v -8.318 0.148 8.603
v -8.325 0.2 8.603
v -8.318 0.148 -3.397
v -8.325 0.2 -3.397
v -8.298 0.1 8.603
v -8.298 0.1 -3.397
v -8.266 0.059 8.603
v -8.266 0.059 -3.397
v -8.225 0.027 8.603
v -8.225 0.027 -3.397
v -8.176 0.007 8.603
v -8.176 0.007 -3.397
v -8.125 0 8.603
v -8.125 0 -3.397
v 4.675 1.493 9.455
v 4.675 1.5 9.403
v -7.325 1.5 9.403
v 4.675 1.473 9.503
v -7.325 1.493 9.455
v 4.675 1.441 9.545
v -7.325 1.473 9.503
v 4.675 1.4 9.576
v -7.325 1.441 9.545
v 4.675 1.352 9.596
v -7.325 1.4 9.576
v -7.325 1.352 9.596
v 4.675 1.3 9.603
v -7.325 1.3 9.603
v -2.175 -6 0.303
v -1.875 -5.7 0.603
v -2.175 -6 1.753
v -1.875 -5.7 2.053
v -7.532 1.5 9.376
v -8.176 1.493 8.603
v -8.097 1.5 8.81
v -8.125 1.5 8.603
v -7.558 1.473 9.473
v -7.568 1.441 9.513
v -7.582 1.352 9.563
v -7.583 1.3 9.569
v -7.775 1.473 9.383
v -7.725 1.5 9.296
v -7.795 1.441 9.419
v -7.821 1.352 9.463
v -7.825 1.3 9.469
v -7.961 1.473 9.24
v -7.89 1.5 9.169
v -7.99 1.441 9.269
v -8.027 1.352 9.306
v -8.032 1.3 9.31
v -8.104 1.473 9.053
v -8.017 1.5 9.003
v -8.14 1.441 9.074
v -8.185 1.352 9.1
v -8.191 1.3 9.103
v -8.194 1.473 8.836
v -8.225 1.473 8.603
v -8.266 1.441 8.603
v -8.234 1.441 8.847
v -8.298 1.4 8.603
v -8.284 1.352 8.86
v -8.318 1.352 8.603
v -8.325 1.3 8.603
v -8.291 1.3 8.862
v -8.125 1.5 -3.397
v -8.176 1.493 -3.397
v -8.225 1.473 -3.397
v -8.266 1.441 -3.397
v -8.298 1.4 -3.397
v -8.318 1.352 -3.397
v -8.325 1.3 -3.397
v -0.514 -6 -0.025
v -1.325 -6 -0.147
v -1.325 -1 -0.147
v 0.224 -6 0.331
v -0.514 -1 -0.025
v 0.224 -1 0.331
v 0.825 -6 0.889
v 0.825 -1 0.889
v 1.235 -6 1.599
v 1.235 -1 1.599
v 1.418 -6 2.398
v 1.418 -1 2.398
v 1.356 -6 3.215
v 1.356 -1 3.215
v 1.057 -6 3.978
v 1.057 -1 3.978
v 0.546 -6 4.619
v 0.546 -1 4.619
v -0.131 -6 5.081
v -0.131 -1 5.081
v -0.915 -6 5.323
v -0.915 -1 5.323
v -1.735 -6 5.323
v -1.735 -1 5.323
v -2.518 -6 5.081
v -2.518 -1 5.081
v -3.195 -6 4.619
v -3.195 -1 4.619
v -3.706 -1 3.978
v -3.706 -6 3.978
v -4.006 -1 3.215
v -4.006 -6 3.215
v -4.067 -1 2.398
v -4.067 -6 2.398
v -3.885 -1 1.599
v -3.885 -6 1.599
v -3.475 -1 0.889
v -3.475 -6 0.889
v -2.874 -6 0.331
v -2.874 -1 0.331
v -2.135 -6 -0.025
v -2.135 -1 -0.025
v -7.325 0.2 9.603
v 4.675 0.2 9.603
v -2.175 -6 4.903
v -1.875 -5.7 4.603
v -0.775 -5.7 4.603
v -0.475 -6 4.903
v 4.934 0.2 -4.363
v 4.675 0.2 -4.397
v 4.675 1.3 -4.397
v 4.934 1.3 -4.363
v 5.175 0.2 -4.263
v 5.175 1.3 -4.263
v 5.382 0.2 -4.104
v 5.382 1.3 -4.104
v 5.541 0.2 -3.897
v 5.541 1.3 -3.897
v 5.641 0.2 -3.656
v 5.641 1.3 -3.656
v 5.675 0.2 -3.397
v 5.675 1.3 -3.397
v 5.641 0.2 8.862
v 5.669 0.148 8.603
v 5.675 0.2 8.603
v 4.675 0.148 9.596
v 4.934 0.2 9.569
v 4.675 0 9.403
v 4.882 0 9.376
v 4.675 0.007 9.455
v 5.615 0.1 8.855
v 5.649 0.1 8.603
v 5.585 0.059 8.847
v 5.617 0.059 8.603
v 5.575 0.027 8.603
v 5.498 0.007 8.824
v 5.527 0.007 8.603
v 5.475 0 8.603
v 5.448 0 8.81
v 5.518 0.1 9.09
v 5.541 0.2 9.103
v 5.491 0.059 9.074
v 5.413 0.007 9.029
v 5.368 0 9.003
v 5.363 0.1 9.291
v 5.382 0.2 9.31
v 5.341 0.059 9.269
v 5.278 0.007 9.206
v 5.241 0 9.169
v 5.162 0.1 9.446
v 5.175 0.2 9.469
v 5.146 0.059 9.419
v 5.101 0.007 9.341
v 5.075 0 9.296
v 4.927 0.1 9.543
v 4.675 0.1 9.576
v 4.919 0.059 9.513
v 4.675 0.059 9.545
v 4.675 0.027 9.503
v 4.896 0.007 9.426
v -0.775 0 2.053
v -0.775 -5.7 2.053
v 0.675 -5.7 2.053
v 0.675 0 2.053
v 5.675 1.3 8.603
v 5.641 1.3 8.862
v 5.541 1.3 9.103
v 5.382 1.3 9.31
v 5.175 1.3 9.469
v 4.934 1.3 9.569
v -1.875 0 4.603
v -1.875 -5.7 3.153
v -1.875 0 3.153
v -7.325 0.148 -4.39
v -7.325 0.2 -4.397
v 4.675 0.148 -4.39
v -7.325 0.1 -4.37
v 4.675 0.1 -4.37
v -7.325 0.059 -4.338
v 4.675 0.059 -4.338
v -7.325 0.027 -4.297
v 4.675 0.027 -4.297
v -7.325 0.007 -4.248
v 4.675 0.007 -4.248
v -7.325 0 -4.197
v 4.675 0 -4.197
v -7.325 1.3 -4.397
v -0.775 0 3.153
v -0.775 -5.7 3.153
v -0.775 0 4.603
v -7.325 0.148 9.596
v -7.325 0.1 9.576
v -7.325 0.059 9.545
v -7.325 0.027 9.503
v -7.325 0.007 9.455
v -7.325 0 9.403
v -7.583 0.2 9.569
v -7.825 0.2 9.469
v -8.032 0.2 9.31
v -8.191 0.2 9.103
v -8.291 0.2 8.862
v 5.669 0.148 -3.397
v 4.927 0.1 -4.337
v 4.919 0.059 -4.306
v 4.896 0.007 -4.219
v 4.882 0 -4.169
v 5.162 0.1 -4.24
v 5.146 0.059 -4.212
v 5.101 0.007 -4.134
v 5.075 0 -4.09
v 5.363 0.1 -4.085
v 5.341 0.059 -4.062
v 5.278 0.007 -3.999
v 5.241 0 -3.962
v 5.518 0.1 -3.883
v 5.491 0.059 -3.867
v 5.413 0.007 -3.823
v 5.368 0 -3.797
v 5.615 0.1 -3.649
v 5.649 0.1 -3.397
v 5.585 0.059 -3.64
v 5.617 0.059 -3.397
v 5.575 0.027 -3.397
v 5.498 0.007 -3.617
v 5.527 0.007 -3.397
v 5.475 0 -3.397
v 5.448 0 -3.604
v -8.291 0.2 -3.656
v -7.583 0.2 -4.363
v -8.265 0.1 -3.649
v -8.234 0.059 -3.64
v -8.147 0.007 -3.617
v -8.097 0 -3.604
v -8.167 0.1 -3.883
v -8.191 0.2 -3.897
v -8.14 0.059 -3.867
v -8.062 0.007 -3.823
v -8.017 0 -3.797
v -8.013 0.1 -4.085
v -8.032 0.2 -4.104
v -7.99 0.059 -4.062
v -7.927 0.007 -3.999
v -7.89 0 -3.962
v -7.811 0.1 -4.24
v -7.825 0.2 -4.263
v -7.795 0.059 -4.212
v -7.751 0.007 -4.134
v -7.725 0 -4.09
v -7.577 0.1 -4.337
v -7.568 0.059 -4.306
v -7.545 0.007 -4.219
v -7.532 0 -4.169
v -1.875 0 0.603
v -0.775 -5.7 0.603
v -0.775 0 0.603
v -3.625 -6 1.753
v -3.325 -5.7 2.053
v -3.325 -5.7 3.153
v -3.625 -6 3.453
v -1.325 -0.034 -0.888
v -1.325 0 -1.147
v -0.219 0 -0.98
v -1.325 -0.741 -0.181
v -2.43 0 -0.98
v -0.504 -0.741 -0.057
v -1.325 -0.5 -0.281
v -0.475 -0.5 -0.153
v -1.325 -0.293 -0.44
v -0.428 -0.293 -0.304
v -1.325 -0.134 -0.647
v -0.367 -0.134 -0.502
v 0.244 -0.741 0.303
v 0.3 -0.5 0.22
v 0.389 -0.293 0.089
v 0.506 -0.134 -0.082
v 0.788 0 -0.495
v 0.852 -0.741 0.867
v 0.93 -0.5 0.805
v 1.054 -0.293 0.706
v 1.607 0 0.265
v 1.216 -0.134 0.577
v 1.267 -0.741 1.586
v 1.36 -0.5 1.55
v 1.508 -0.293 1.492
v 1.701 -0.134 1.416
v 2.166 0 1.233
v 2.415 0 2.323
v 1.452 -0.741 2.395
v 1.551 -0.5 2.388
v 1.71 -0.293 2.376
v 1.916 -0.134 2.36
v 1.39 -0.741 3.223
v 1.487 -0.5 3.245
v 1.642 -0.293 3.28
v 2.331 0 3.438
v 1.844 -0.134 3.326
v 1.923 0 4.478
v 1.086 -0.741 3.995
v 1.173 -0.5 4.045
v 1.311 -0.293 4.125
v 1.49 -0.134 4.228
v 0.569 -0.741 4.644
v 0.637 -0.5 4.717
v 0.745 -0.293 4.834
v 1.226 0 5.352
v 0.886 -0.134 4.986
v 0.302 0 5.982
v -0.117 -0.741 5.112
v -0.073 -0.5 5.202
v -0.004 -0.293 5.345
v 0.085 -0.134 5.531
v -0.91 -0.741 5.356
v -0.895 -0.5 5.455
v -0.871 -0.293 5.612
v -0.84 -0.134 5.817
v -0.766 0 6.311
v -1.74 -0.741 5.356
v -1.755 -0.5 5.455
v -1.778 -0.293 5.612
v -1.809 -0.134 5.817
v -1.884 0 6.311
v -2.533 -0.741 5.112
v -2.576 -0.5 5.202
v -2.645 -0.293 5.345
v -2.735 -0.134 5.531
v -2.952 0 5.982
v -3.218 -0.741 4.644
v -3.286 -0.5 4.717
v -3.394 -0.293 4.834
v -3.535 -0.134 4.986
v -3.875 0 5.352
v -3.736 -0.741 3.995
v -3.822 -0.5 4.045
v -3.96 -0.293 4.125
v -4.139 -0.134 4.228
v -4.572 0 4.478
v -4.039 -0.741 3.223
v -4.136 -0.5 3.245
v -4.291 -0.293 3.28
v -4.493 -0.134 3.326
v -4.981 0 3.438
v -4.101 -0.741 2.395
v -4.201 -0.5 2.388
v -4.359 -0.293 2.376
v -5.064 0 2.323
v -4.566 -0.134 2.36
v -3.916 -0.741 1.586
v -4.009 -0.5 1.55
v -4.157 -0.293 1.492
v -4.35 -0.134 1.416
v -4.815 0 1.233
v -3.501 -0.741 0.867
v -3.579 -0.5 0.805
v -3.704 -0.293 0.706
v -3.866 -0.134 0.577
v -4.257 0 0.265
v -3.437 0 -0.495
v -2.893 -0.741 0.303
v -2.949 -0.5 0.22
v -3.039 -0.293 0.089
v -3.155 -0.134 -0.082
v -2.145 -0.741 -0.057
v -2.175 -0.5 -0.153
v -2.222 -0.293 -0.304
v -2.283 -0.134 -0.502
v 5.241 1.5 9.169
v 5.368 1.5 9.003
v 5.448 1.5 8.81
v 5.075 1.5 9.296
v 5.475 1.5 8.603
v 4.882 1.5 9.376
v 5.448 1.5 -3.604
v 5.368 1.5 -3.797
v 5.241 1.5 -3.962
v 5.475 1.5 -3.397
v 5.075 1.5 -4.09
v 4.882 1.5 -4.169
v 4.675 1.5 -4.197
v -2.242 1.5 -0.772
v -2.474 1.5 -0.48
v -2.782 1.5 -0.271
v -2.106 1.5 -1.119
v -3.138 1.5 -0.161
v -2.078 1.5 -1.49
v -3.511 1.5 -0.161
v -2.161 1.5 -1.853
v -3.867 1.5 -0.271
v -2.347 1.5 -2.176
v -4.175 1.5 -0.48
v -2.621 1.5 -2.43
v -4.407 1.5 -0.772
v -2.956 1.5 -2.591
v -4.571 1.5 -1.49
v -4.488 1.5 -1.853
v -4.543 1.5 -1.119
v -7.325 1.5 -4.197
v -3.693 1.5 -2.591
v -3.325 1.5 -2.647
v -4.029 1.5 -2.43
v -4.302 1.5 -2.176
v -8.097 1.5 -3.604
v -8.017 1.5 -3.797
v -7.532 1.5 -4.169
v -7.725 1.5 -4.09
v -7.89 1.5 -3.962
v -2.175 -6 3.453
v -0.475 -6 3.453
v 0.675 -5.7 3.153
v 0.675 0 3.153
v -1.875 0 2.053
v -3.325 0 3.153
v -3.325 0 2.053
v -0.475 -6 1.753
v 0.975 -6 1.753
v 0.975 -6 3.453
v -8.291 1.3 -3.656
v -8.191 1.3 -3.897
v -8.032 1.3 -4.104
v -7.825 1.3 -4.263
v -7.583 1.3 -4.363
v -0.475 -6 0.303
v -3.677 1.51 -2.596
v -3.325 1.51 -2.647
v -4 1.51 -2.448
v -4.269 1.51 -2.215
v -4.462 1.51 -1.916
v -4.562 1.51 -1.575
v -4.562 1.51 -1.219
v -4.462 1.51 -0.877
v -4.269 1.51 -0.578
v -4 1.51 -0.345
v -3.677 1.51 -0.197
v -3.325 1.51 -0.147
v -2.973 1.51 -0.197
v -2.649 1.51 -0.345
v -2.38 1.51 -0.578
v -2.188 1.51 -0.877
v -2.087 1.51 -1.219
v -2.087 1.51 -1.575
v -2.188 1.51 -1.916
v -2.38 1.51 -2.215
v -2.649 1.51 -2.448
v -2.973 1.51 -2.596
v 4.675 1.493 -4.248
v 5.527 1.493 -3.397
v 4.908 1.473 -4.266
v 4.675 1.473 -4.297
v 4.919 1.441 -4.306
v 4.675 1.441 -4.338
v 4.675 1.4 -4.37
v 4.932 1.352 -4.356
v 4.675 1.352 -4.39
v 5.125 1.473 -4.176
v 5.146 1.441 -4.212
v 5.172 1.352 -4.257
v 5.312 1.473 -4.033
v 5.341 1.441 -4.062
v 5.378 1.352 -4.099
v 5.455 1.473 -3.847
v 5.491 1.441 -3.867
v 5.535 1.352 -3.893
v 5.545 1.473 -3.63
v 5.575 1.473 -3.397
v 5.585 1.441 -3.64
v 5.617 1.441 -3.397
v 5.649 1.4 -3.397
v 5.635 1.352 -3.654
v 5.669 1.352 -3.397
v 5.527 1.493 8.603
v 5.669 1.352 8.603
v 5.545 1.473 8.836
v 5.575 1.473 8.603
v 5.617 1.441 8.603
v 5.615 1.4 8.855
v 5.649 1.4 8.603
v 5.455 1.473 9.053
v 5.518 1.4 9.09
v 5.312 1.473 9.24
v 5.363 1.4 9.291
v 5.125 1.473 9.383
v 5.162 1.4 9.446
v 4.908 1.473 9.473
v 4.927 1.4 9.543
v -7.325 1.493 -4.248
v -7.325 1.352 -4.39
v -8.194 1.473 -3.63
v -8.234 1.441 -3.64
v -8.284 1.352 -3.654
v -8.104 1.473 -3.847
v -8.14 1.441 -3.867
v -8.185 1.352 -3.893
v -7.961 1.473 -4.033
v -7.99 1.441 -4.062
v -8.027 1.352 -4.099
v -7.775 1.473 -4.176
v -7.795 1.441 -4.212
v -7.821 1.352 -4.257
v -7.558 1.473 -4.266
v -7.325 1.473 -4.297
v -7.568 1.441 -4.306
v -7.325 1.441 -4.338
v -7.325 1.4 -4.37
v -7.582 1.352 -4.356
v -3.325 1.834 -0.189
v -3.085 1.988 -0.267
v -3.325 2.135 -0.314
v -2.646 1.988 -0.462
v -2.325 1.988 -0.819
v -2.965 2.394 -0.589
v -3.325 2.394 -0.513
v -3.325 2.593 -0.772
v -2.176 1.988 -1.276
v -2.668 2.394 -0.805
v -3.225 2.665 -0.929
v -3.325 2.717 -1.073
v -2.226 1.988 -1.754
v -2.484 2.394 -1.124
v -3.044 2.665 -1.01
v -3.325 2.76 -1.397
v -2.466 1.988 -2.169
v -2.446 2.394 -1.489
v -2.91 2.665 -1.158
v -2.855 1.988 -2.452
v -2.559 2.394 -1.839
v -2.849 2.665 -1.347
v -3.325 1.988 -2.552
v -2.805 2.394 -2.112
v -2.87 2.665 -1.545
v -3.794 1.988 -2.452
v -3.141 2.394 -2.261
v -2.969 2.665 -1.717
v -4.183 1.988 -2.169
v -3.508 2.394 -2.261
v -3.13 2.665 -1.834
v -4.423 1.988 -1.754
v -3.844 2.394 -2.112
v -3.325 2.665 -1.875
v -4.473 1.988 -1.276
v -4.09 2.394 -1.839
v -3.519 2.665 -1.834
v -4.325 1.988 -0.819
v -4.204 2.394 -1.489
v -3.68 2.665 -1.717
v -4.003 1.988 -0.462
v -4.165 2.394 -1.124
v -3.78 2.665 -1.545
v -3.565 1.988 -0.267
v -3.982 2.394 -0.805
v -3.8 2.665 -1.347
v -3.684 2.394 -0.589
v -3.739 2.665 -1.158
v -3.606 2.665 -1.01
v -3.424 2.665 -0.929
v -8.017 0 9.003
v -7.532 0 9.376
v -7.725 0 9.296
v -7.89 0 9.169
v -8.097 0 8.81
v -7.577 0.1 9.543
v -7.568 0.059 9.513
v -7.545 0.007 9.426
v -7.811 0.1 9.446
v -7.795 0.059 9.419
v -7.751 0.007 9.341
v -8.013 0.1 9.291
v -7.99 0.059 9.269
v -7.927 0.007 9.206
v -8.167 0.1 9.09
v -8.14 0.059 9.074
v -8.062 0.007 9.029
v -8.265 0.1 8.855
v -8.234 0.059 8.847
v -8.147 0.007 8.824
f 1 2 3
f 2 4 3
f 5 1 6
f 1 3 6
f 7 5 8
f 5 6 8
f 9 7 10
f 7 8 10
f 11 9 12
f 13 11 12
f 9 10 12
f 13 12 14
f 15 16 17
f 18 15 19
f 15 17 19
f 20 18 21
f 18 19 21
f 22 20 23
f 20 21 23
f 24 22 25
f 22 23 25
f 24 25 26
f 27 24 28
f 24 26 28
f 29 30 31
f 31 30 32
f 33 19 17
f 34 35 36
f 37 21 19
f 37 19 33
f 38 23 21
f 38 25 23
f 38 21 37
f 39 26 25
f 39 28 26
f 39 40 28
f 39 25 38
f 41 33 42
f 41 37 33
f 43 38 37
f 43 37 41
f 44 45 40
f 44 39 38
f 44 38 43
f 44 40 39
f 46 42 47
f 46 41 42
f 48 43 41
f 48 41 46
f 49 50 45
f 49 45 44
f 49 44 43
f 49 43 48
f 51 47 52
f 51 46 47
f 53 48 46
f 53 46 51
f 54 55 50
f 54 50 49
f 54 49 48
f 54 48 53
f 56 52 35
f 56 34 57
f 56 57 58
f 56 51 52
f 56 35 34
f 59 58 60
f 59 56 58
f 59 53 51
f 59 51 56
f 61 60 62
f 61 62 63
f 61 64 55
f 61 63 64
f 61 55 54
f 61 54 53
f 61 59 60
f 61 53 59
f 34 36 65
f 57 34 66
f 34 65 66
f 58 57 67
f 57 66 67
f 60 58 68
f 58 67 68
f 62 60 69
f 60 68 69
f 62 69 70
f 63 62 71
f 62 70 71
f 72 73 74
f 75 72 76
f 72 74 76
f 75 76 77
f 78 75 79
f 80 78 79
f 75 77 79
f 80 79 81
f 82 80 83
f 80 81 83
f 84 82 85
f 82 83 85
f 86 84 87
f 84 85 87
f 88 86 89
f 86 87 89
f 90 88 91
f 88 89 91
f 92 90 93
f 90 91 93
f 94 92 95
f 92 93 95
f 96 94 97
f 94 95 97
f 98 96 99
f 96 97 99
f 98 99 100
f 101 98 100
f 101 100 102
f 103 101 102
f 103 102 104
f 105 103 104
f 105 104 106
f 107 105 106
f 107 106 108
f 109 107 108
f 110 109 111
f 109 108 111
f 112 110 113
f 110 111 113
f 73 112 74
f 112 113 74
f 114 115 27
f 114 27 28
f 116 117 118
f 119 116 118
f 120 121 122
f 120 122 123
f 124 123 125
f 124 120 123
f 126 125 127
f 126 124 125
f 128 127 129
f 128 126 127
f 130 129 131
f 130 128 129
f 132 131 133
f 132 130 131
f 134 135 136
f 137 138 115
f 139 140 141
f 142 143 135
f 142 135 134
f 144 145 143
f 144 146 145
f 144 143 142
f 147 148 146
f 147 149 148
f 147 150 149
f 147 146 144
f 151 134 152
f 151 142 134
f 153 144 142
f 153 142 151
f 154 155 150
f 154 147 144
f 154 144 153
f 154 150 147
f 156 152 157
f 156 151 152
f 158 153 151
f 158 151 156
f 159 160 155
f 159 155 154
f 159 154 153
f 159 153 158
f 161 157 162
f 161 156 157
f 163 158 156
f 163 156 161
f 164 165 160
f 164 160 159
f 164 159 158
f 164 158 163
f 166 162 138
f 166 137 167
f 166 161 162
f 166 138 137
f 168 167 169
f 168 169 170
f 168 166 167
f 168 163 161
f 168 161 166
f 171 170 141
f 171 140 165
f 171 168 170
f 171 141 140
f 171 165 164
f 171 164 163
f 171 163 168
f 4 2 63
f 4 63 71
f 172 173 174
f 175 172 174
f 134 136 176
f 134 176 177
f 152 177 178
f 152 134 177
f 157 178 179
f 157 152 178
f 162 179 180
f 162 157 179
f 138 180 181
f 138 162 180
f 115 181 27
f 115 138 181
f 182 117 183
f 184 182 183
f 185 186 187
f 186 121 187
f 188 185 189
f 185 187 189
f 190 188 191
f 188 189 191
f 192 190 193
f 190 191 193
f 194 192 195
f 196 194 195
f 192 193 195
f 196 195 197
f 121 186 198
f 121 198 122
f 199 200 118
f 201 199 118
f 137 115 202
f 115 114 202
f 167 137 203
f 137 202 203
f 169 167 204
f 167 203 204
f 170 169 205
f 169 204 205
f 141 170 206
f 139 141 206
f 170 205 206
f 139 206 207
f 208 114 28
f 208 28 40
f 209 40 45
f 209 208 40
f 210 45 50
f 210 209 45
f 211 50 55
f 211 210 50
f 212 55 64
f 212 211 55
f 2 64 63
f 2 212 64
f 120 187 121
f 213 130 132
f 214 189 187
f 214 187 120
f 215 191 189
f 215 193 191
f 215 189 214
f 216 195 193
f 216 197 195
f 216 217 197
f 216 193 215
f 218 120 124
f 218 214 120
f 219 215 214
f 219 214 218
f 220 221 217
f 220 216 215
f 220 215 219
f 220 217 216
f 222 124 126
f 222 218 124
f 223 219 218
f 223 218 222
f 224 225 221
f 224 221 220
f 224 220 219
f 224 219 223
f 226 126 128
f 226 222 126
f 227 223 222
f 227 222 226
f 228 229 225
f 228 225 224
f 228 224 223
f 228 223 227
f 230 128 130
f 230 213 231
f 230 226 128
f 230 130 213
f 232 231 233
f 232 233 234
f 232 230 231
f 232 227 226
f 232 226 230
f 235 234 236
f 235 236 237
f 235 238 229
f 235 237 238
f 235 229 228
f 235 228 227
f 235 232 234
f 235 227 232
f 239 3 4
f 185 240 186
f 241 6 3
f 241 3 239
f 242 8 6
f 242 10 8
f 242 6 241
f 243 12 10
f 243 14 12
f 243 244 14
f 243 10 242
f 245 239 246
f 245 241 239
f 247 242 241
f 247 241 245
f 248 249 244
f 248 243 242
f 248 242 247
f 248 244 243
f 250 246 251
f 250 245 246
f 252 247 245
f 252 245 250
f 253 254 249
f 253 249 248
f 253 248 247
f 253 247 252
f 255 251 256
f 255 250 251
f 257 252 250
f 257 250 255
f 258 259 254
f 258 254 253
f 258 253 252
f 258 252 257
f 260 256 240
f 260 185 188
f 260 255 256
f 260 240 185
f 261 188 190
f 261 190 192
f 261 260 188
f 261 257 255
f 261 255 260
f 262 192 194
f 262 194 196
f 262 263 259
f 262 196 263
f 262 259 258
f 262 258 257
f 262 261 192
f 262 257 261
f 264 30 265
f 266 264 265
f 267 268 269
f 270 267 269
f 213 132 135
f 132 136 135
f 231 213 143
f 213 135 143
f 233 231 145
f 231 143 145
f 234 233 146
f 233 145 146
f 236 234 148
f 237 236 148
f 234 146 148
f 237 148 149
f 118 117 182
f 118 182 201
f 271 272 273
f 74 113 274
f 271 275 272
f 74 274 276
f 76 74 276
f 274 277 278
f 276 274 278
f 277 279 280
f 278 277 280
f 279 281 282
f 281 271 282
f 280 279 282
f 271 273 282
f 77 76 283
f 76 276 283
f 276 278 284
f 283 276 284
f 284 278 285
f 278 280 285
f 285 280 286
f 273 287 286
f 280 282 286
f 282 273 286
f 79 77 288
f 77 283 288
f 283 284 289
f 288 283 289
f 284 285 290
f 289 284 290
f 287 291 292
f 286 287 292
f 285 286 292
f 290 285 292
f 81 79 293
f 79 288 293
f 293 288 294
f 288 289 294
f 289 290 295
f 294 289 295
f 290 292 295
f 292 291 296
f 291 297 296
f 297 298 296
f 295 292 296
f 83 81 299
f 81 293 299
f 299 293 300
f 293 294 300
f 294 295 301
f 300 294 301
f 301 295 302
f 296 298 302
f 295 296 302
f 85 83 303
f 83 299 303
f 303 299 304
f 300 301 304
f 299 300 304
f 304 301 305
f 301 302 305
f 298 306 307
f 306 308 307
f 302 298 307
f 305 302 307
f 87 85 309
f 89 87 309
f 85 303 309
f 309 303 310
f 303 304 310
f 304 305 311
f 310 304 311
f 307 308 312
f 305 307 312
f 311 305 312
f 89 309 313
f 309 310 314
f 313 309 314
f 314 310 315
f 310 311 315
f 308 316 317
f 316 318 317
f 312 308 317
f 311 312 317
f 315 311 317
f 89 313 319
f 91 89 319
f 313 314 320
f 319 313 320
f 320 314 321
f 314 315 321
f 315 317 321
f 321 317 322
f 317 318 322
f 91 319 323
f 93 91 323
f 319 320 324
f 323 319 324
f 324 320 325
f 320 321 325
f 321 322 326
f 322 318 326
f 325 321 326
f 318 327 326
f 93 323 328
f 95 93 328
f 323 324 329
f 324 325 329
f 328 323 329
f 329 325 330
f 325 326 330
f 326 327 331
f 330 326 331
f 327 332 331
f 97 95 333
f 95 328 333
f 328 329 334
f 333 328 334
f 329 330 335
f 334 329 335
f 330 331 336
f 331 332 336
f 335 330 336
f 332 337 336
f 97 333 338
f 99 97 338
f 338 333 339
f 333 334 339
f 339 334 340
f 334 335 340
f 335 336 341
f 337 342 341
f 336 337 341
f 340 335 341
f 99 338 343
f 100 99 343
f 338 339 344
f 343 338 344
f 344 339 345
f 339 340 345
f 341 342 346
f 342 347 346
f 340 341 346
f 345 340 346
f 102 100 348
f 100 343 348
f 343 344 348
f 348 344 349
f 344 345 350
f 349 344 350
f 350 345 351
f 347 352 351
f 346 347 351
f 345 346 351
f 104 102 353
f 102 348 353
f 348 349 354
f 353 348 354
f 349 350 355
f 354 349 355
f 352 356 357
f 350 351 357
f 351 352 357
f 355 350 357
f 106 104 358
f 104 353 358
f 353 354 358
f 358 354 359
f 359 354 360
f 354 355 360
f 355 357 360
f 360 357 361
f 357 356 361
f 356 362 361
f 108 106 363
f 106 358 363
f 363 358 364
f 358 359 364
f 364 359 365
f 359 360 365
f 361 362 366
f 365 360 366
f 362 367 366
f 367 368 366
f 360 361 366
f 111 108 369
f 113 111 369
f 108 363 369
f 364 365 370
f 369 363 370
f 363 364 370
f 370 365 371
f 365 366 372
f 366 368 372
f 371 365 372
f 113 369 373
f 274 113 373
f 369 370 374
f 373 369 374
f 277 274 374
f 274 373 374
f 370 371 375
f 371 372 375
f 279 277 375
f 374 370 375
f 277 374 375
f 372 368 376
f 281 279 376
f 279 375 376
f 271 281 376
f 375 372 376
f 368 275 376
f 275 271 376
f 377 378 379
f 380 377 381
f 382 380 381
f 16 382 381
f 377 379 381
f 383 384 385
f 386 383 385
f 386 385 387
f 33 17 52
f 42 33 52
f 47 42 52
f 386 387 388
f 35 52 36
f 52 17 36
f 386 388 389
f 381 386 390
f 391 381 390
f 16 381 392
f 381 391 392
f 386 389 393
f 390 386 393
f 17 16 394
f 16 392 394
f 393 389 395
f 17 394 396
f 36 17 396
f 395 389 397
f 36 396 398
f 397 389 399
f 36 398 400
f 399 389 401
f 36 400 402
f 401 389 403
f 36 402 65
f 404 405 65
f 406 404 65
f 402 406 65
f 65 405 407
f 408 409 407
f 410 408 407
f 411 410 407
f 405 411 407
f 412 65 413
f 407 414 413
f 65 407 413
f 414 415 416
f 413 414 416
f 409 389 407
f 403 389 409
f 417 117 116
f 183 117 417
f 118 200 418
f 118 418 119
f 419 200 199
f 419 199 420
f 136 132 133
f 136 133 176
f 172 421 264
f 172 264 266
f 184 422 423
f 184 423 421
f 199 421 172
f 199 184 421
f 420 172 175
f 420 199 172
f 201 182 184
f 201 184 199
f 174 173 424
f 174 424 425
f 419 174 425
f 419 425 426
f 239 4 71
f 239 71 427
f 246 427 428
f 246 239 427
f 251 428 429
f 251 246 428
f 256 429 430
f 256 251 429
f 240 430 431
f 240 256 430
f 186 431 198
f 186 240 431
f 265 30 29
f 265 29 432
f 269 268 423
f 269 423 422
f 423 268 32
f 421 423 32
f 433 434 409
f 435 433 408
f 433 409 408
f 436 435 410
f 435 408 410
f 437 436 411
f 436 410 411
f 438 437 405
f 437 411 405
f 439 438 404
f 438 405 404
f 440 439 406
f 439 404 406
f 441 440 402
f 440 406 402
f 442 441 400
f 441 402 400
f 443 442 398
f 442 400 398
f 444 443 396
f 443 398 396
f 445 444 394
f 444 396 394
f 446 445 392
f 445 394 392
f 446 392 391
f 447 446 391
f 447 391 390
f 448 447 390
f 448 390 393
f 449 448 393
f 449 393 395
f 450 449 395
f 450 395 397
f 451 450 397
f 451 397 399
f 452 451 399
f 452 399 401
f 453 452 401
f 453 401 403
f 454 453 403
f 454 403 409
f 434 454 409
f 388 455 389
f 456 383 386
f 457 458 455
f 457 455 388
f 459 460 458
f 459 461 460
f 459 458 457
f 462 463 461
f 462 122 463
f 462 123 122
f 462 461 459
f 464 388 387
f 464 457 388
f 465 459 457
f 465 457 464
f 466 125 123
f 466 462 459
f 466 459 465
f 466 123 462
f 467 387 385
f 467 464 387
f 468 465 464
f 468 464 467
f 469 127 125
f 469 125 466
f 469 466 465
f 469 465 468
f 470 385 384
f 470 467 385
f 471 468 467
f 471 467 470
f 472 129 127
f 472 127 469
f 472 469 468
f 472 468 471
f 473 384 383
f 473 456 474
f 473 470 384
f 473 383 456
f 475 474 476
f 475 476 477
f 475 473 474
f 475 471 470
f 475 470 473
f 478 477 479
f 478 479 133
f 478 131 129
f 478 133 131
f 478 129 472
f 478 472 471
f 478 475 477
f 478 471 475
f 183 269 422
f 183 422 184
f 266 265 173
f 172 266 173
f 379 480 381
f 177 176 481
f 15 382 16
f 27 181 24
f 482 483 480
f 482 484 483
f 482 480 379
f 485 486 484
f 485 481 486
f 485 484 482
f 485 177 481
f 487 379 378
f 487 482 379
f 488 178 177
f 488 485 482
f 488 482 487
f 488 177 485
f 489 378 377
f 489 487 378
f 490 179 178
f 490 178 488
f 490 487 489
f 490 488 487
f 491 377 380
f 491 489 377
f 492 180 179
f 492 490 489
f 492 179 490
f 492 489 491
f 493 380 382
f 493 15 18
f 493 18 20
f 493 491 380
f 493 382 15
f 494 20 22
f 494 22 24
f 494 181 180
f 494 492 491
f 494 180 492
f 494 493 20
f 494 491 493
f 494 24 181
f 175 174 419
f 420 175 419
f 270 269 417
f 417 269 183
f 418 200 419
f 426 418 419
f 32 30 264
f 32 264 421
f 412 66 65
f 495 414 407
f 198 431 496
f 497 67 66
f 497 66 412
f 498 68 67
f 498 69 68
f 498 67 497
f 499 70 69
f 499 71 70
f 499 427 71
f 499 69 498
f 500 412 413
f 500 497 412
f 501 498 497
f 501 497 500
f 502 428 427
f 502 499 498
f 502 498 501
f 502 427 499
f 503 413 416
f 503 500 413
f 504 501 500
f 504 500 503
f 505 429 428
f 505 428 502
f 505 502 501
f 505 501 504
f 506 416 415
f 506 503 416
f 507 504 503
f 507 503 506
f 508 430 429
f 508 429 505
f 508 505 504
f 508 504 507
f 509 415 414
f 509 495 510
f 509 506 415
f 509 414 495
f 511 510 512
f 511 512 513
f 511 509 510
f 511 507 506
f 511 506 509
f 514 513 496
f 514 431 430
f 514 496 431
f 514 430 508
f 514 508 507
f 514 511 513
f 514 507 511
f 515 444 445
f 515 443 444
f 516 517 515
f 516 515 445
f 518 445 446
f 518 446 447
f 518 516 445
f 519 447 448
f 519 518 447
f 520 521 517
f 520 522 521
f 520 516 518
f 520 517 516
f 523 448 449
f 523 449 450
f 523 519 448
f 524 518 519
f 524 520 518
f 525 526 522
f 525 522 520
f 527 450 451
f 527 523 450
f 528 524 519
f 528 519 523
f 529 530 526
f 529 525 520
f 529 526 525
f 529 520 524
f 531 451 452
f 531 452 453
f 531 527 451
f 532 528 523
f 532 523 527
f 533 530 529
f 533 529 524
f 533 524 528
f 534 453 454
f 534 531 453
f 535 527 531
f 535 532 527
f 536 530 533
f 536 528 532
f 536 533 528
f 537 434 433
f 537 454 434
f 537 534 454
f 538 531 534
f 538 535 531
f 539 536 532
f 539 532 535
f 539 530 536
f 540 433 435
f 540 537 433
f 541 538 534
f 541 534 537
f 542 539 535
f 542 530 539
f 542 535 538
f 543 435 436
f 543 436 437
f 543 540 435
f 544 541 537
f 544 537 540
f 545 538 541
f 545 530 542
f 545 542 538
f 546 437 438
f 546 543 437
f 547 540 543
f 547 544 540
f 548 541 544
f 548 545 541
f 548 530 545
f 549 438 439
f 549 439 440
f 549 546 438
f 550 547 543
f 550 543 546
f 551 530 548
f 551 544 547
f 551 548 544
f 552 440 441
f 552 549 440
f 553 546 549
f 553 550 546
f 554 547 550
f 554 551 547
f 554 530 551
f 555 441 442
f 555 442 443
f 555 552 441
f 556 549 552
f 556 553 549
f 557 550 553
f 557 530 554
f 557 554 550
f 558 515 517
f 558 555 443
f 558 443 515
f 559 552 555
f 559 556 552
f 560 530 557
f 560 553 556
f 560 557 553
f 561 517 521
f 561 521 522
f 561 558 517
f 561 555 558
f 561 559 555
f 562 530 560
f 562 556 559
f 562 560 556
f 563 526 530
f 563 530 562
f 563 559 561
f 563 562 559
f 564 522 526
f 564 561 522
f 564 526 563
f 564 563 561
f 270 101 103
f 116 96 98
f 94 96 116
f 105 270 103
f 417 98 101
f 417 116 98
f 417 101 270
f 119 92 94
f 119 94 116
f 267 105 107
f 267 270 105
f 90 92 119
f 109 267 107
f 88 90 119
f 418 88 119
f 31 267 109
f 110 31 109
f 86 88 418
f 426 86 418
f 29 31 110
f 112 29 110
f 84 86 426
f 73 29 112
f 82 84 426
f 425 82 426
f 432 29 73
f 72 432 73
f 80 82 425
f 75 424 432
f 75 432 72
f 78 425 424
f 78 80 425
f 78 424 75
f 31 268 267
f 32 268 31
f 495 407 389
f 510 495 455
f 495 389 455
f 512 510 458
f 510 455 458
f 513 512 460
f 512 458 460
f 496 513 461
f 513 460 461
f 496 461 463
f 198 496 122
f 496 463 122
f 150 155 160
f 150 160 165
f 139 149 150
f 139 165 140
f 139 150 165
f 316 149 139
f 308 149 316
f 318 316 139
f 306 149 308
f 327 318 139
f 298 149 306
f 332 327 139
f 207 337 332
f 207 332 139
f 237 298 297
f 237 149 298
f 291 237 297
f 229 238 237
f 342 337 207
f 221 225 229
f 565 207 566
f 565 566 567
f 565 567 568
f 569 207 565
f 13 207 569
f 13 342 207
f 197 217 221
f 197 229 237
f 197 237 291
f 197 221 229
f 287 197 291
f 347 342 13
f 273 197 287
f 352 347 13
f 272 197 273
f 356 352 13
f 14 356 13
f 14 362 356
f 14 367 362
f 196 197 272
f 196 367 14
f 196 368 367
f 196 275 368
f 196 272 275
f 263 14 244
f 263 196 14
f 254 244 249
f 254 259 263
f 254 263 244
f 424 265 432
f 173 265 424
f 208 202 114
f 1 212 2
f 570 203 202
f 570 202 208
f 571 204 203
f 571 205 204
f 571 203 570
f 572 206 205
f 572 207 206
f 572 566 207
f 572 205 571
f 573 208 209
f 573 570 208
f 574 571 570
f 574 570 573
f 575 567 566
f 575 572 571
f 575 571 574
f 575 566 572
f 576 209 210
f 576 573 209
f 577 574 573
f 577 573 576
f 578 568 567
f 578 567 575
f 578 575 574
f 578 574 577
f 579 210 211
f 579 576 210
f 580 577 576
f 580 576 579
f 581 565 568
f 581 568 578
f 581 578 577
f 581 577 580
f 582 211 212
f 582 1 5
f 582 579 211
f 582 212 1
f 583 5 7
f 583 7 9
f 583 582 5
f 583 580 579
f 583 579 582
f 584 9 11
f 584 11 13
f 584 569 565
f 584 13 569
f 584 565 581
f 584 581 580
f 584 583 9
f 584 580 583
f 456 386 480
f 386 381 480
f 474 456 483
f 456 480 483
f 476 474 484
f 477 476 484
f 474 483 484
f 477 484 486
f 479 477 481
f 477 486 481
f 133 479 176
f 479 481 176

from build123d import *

# Parameters (mm, degrees)
BOSS_EXTRUDE1_DEPTH = 1.5
SKETCH2_R           = 2.75
BOSS_EXTRUDE2_DEPTH = 6
SKETCH3_W           = 1.1
SKETCH3_H           = 1.45
SKETCH3_W_2         = 1.45
SKETCH3_H_2         = 1.1
CUT_EXTRUDE1_DEPTH  = 6
CHAMFER1_SIZE       = 0.3
FILLET1_R           = 1
SKETCH4_R           = 1.25
BOSS_EXTRUDE3_DEPTH = 0.01
DOME1_FACE_RADIUS   = 1.25
DOME1_HEIGHT        = 1.25
FILLET3_R           = 0.2


with BuildPart() as part:
    # Sketch1 → Boss-Extrude1 (new body)
    with BuildSketch(Plane(origin=(0, 0, 0), x_dir=(1, 0, 0), z_dir=(0, 1, 0))):
        with BuildLine():
            Line((-7.324675649, 4.396717546), (4.675324351, 4.396717546))
            ThreePointArc((4.675324351, 4.396717546), (5.382431132, 4.103824327), (5.675324351, 3.396717546))
            Line((5.675324351, 3.396717546), (5.675324351, -8.603282454))
            ThreePointArc((5.675324351, -8.603282454), (5.382431132, -9.310389235), (4.675324351, -9.603282454))
            Line((4.675324351, -9.603282454), (-7.324675649, -9.603282454))
            ThreePointArc((-7.324675649, -9.603282454), (-8.03178243, -9.310389235), (-8.324675649, -8.603282454))
            Line((-8.324675649, -8.603282454), (-8.324675649, 3.396717546))
            ThreePointArc((-8.324675649, 3.396717546), (-8.03178243, 4.103824327), (-7.324675649, 4.396717546))
        make_face()
    extrude(amount=BOSS_EXTRUDE1_DEPTH)

    # Sketch2 → Boss-Extrude2 (add)
    with BuildSketch(Plane.XZ):
        with Locations(Location((-1.324675649, 2.603282454, 0), (0, 0, 270))):
            Circle(SKETCH2_R)
    extrude(amount=BOSS_EXTRUDE2_DEPTH)

    # Sketch3 → Cut-Extrude1 (cut)
    with BuildSketch(Plane.XZ.offset(6)):
        with Locations((-1.324675649, 3.878282454)):
            Rectangle(SKETCH3_W, SKETCH3_H)
        with Locations((-0.049675649, 2.603282454)):
            Rectangle(SKETCH3_W_2, SKETCH3_H_2)
        with Locations((-1.324675649, 2.603282454)):
            Rectangle(SKETCH3_W, SKETCH3_H_2)
        with Locations((-2.599675649, 2.603282454)):
            Rectangle(SKETCH3_W_2, SKETCH3_H_2)
        with Locations((-1.324675649, 1.328282454)):
            Rectangle(SKETCH3_W, SKETCH3_H)
    extrude(amount=-CUT_EXTRUDE1_DEPTH, mode=Mode.SUBTRACT)

    # Chamfer1
    chamfer1_edges = [part.edges().sort_by_distance(p)[0] for p in [
        (-0.774675649, -6, 3.878282454),
        (-0.049675649, -6, 3.153282454),
        (0.675324351, -6, 2.603282454),
        (-0.774675649, -6, 1.328282454),
        (-2.599675649, -6, 3.153282454),
        (-1.324675649, -6, 4.603282454),
        (-1.874675649, -6, 3.878282454),
        (-3.324675649, -6, 2.603282454),
        (-2.599675649, -6, 2.053282454),
        (-1.874675649, -6, 1.328282454),
        (-1.324675649, -6, 0.603282454),
        (-0.049675649, -6, 2.053282454),
    ]]
    chamfer(chamfer1_edges, length=CHAMFER1_SIZE)

    # Fillet1
    fillet1_edges = [part.edges().sort_by_distance(p)[0] for p in [
        (-1.324675649, 0, 5.353282454),
    ]]
    fillet(fillet1_edges, radius=FILLET1_R)

    # Sketch4 → Boss-Extrude3 (add)
    with BuildSketch(Plane(origin=(0, 1.5, 0), x_dir=(1, 0, 0), z_dir=(0, 1, 0))):
        with Locations(Location((-3.324675649, 1.396717546, 0), (0, 0, 90))):
            Circle(SKETCH4_R)
    extrude(amount=BOSS_EXTRUDE3_DEPTH)

    # Dome1: a dome of height H over a round flat face of radius A is a cap of a sphere of radius (A * A + H * H) / (2 * H)
    dome1_r = (DOME1_FACE_RADIUS * DOME1_FACE_RADIUS + DOME1_HEIGHT * DOME1_HEIGHT) / (2 * DOME1_HEIGHT)
    dome1_base = Plane((-3.324675649, 1.51, -1.396717546), z_dir=(0, 1, 0))
    with Locations(dome1_base.offset(DOME1_HEIGHT - dome1_r)):
        dome1_ball = Sphere(dome1_r, mode=Mode.PRIVATE)
    add(split(dome1_ball, bisect_by=dome1_base, keep=Keep.TOP, mode=Mode.PRIVATE))

    # Fillet3
    fillet3_edges = [part.edges().sort_by_distance(p)[0] for p in [
        (5.382431132, 1.5, 9.310389235),
        (-1.324675649, 0, 9.603282454),
        (-8.03178243, 0, 9.310389235),
        (5.675324351, 1.5, 2.603282454),
        (5.382431132, 1.5, -4.103824327),
        (-1.324675649, 1.5, -4.396717546),
        (-8.03178243, 1.5, -4.103824327),
        (-8.324675649, 1.5, 2.603282454),
        (-8.03178243, 1.5, 9.310389235),
        (-1.324675649, 1.5, 9.603282454),
        (-8.324675649, 0, 2.603282454),
        (-8.03178243, 0, -4.103824327),
        (-1.324675649, 0, -4.396717546),
        (5.382431132, 0, -4.103824327),
        (5.675324351, 0, 2.603282454),
        (5.382431132, 0, 9.310389235),
    ]]
    fillet(fillet3_edges, radius=FILLET3_R)


solid = part.part
